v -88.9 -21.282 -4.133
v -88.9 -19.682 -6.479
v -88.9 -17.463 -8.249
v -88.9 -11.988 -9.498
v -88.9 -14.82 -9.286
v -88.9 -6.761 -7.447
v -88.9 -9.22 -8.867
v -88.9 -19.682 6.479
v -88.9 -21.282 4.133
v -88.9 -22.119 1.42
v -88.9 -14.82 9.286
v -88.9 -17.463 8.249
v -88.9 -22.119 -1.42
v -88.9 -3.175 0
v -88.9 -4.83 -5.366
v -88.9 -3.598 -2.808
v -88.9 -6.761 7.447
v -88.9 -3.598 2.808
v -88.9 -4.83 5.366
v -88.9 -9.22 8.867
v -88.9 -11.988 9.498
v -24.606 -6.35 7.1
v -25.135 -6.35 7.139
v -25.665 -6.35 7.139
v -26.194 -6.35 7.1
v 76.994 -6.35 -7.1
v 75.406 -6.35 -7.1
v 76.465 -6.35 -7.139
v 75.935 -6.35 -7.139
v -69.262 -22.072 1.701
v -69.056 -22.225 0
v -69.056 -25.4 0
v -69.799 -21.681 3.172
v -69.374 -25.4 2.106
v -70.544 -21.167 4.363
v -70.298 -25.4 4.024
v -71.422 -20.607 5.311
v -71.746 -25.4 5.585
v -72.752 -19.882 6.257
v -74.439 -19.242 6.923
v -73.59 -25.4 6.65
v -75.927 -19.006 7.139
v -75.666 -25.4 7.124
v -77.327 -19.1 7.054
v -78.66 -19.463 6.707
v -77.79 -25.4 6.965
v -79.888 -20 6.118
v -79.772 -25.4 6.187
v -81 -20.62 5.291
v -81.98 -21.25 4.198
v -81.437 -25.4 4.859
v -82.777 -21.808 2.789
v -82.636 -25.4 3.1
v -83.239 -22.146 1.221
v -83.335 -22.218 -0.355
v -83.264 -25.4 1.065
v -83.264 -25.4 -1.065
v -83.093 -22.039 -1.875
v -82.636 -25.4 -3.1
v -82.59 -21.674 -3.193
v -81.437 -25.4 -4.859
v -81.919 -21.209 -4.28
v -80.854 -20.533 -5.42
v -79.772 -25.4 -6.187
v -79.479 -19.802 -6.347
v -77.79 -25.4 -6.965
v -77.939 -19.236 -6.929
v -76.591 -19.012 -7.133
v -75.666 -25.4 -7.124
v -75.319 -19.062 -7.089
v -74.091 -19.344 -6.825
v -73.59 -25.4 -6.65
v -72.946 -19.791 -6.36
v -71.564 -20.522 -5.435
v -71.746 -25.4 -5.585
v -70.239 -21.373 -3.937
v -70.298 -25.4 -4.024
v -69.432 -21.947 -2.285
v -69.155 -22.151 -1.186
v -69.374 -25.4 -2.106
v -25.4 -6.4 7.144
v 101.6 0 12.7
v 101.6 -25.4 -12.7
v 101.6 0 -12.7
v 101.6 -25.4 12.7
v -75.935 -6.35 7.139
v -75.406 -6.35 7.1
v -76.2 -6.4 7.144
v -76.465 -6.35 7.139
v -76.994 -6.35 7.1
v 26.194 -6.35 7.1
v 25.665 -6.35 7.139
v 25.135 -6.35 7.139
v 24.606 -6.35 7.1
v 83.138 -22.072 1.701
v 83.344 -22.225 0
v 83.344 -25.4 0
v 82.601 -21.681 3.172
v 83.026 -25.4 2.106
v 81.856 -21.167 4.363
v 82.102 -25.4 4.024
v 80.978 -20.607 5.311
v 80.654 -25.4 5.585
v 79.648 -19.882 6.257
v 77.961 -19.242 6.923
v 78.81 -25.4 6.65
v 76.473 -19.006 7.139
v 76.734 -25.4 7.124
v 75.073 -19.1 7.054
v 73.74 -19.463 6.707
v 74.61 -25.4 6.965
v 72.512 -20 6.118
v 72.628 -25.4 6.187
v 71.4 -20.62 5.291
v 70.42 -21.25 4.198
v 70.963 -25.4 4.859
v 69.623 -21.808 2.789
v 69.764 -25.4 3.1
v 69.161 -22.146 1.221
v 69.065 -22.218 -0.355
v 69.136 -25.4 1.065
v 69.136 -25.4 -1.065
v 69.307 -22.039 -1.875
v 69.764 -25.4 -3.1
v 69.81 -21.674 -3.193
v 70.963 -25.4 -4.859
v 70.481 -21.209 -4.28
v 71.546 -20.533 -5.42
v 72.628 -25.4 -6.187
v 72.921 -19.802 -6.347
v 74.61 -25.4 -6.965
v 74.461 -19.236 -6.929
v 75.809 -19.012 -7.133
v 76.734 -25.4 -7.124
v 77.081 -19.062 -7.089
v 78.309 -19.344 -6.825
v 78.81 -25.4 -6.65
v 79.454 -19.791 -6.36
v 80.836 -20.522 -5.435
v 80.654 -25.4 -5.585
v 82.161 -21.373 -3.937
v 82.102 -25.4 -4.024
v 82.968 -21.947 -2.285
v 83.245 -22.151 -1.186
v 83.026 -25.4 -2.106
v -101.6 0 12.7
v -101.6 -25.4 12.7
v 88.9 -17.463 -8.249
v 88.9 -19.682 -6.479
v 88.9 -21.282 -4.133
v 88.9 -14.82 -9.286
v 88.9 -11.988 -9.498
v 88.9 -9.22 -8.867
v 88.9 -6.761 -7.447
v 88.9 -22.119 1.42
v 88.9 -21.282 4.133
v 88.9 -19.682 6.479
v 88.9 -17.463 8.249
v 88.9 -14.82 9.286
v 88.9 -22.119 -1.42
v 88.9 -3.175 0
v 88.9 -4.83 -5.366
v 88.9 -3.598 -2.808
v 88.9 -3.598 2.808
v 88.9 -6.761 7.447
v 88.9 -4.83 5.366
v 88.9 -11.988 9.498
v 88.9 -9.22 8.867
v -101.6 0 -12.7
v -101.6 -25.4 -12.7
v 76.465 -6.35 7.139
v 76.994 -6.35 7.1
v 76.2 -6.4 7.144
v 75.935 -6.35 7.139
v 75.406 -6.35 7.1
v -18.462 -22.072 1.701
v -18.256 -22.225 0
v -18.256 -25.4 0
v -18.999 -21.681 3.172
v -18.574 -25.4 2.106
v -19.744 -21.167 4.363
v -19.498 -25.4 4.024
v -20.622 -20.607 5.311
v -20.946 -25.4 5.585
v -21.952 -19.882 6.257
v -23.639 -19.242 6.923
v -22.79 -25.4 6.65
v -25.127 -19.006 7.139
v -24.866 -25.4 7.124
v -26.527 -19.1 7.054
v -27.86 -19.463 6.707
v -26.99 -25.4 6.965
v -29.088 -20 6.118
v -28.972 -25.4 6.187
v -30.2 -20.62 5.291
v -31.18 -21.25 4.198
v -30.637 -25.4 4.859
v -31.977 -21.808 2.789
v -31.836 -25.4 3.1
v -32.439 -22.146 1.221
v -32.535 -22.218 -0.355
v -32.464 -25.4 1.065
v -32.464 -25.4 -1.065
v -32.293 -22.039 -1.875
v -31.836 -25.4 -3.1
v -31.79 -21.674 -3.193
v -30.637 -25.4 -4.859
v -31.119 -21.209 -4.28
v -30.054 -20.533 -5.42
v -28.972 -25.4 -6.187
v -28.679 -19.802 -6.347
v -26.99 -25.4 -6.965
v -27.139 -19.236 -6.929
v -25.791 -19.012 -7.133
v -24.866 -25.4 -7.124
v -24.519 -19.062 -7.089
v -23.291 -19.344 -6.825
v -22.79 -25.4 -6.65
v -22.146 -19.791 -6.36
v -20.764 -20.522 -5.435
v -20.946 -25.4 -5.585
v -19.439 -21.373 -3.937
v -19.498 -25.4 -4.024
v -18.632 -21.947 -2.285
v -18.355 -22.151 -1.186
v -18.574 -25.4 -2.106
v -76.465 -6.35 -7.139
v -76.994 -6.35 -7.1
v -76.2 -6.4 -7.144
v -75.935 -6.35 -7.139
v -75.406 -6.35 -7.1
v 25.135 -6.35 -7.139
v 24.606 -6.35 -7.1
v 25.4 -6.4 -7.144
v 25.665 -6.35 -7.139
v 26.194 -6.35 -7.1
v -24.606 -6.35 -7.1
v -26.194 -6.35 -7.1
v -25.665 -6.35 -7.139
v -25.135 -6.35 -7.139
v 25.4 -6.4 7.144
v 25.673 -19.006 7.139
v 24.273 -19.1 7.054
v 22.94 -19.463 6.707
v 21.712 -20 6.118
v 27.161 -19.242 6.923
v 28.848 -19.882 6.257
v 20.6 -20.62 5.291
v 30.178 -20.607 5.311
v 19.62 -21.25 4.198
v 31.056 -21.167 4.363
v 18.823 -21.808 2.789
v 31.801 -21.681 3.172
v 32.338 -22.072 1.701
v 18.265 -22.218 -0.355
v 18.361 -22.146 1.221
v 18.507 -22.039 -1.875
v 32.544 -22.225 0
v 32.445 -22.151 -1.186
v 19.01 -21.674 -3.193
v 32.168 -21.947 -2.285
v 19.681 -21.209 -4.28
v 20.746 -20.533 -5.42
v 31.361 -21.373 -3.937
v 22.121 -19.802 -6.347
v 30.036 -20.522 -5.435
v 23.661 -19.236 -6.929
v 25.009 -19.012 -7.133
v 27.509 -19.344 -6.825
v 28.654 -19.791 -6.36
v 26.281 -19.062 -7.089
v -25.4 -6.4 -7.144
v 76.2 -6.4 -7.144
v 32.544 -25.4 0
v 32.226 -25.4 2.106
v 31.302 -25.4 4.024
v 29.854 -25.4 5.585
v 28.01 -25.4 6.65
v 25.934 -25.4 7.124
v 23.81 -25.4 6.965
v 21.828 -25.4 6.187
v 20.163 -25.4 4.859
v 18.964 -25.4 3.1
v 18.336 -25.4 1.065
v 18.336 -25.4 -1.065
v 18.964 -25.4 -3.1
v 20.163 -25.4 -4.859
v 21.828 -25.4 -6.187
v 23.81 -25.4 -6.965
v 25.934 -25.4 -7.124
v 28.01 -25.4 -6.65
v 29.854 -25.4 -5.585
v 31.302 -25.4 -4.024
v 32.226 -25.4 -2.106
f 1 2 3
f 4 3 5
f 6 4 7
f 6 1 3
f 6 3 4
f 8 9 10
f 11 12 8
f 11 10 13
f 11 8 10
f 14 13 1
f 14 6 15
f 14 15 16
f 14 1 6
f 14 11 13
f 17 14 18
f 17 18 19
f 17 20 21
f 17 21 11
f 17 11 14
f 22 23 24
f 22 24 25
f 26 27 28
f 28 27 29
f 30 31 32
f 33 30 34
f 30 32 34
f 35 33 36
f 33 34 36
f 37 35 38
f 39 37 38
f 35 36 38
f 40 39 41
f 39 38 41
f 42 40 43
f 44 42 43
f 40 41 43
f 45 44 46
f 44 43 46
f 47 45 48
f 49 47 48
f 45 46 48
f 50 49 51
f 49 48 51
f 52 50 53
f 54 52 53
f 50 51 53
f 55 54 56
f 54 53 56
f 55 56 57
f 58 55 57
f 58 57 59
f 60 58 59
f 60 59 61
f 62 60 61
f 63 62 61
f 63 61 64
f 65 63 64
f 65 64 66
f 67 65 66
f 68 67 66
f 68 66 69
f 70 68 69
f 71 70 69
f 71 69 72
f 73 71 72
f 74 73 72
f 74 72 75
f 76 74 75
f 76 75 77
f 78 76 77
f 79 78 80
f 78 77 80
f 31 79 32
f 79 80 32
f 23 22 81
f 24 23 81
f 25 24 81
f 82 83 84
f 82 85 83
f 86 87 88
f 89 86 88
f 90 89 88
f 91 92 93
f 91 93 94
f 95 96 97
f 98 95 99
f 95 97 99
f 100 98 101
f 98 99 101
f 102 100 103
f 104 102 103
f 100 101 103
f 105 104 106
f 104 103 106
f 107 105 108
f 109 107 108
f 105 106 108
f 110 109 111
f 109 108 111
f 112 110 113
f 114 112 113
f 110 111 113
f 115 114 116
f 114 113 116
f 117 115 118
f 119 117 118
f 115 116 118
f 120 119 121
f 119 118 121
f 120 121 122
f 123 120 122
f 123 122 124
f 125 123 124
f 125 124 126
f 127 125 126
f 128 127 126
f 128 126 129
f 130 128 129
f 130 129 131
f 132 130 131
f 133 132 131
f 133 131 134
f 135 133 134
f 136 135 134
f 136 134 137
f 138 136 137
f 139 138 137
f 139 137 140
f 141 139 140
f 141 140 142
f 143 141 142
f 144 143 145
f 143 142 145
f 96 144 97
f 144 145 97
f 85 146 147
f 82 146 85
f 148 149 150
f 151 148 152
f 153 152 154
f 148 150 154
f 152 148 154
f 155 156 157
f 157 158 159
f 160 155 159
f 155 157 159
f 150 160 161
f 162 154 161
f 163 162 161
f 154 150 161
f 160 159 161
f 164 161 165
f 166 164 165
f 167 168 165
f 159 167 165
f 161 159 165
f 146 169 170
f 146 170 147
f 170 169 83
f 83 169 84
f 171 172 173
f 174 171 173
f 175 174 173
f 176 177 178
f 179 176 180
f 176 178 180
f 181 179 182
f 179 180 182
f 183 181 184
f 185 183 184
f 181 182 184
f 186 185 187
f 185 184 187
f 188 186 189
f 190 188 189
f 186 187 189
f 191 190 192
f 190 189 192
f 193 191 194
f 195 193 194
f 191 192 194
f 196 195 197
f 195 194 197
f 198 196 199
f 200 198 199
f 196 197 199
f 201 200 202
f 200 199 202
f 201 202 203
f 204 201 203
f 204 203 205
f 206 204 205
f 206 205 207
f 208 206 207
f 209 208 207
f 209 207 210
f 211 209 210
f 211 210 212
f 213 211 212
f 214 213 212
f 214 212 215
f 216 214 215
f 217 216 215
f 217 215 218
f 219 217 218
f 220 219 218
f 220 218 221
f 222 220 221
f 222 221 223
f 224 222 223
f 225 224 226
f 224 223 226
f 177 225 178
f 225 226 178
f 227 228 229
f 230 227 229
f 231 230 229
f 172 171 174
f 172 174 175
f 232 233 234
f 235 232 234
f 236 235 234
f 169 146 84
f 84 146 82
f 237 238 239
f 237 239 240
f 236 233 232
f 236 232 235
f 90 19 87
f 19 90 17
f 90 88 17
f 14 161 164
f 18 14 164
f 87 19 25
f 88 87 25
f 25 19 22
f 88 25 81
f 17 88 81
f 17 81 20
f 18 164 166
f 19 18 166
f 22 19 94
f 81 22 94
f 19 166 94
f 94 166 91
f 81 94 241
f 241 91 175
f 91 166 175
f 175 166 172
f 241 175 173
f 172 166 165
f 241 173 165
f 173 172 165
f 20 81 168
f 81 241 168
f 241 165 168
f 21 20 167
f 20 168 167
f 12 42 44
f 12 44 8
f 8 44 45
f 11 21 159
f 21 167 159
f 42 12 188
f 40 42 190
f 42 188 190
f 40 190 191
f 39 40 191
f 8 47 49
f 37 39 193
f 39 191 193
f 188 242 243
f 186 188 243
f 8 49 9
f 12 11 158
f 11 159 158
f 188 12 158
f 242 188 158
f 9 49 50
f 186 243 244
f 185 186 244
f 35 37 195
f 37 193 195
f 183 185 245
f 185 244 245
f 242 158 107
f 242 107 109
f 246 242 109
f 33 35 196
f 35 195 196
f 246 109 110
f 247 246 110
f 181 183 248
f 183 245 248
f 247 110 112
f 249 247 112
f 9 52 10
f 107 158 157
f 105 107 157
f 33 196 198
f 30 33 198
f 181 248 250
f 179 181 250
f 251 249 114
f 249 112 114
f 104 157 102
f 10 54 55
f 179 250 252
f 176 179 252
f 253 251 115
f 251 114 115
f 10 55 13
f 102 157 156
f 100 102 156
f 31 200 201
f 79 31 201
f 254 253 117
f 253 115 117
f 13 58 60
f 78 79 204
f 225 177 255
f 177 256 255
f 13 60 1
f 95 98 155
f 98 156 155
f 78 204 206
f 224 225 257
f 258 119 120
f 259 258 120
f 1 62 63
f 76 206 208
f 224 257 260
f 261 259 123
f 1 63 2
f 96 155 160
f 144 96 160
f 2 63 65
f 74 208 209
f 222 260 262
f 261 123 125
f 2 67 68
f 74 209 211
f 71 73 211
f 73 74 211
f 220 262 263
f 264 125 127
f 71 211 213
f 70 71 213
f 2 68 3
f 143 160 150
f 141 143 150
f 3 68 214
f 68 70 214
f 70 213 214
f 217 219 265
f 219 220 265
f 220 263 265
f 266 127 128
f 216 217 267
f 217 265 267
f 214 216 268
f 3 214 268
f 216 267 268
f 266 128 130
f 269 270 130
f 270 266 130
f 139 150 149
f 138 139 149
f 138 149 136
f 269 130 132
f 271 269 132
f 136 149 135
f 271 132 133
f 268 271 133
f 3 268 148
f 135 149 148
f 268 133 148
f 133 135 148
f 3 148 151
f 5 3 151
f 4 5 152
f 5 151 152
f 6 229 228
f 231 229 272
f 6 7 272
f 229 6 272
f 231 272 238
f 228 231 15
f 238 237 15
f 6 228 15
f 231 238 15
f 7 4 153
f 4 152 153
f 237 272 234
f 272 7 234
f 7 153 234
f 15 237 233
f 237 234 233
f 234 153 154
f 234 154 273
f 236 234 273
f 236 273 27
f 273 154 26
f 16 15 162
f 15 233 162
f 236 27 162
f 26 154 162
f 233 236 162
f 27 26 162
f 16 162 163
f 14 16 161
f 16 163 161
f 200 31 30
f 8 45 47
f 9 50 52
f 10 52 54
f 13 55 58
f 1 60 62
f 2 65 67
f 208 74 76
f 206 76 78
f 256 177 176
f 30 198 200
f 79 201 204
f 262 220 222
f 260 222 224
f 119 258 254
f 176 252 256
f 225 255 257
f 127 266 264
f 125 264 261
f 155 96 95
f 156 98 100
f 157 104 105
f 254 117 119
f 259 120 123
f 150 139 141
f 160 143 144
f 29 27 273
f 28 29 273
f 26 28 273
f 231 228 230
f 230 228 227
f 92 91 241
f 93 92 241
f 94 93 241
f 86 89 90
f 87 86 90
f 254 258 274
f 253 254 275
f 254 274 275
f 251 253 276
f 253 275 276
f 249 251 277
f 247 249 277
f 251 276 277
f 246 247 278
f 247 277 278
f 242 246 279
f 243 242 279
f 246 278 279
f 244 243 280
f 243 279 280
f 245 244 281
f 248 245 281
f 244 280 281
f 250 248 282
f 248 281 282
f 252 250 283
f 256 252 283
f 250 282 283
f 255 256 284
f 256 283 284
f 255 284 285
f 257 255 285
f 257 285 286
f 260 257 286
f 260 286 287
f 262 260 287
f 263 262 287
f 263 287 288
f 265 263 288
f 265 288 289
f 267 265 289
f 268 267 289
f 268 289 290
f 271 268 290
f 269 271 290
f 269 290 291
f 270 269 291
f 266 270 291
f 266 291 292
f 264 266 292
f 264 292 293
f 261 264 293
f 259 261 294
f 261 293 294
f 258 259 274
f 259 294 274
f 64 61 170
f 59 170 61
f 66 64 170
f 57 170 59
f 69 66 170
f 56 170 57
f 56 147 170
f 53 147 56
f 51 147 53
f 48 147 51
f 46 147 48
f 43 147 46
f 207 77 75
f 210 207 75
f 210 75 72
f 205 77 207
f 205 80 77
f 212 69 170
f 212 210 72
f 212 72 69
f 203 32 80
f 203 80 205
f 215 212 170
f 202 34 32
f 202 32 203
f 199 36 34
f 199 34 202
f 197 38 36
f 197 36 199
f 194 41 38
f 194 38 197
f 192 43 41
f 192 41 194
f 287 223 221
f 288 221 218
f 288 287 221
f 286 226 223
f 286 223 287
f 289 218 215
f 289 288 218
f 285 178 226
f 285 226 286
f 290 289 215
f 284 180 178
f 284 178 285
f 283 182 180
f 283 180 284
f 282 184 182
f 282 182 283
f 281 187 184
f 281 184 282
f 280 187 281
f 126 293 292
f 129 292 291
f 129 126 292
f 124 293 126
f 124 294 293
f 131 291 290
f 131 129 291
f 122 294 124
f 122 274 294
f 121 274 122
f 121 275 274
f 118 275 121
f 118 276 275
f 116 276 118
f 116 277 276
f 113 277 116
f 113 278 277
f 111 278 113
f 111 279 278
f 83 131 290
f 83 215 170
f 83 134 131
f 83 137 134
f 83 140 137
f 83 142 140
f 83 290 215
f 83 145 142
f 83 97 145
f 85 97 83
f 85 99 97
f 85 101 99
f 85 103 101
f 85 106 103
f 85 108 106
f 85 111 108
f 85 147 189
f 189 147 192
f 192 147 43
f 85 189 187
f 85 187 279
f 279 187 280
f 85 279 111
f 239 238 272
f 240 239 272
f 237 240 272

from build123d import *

# Parameters (mm, degrees)
F0_W     = 203.2
F0_H     = 25.4
F1_DEPTH = 25.4
F3_R     = 9.525
F4_DEPTH = 190.5
F5_R     = 9.525
F6_DEPTH = 12.7
F2_R     = 7.14375
F7_DEPTH = 19.05


with BuildPart() as f1:
    # F0 (on Front) → F1 (new body)
    with BuildSketch(Plane.XZ):
        Rectangle(F0_W, F0_H)
    extrude(amount=F1_DEPTH)

    # F3 (on face) → F4 (cut)
    with BuildSketch(Plane.YZ.offset(101.6)):
        with Locations((-12.7, 0)):
            Circle(F3_R)
    extrude(amount=-F4_DEPTH, mode=Mode.SUBTRACT)

    # F5 (on face) → F6 (join)
    with BuildSketch(Plane.YZ.offset(101.6)):
        with Locations((-12.7, 0)):
            Circle(F5_R)
    extrude(amount=-F6_DEPTH)

    # F2 (on face) → F7 (cut)
    with BuildSketch(Plane.XZ.offset(25.4)):
        with Locations((-76.2, 0)):
            Circle(F2_R)
        with Locations((-25.4, 0)):
            Circle(F2_R)
        with Locations((25.4, 0)):
            Circle(F2_R)
        with Locations((76.2, 0)):
            Circle(F2_R)
    extrude(amount=-F7_DEPTH, mode=Mode.SUBTRACT)


solid = f1.part
